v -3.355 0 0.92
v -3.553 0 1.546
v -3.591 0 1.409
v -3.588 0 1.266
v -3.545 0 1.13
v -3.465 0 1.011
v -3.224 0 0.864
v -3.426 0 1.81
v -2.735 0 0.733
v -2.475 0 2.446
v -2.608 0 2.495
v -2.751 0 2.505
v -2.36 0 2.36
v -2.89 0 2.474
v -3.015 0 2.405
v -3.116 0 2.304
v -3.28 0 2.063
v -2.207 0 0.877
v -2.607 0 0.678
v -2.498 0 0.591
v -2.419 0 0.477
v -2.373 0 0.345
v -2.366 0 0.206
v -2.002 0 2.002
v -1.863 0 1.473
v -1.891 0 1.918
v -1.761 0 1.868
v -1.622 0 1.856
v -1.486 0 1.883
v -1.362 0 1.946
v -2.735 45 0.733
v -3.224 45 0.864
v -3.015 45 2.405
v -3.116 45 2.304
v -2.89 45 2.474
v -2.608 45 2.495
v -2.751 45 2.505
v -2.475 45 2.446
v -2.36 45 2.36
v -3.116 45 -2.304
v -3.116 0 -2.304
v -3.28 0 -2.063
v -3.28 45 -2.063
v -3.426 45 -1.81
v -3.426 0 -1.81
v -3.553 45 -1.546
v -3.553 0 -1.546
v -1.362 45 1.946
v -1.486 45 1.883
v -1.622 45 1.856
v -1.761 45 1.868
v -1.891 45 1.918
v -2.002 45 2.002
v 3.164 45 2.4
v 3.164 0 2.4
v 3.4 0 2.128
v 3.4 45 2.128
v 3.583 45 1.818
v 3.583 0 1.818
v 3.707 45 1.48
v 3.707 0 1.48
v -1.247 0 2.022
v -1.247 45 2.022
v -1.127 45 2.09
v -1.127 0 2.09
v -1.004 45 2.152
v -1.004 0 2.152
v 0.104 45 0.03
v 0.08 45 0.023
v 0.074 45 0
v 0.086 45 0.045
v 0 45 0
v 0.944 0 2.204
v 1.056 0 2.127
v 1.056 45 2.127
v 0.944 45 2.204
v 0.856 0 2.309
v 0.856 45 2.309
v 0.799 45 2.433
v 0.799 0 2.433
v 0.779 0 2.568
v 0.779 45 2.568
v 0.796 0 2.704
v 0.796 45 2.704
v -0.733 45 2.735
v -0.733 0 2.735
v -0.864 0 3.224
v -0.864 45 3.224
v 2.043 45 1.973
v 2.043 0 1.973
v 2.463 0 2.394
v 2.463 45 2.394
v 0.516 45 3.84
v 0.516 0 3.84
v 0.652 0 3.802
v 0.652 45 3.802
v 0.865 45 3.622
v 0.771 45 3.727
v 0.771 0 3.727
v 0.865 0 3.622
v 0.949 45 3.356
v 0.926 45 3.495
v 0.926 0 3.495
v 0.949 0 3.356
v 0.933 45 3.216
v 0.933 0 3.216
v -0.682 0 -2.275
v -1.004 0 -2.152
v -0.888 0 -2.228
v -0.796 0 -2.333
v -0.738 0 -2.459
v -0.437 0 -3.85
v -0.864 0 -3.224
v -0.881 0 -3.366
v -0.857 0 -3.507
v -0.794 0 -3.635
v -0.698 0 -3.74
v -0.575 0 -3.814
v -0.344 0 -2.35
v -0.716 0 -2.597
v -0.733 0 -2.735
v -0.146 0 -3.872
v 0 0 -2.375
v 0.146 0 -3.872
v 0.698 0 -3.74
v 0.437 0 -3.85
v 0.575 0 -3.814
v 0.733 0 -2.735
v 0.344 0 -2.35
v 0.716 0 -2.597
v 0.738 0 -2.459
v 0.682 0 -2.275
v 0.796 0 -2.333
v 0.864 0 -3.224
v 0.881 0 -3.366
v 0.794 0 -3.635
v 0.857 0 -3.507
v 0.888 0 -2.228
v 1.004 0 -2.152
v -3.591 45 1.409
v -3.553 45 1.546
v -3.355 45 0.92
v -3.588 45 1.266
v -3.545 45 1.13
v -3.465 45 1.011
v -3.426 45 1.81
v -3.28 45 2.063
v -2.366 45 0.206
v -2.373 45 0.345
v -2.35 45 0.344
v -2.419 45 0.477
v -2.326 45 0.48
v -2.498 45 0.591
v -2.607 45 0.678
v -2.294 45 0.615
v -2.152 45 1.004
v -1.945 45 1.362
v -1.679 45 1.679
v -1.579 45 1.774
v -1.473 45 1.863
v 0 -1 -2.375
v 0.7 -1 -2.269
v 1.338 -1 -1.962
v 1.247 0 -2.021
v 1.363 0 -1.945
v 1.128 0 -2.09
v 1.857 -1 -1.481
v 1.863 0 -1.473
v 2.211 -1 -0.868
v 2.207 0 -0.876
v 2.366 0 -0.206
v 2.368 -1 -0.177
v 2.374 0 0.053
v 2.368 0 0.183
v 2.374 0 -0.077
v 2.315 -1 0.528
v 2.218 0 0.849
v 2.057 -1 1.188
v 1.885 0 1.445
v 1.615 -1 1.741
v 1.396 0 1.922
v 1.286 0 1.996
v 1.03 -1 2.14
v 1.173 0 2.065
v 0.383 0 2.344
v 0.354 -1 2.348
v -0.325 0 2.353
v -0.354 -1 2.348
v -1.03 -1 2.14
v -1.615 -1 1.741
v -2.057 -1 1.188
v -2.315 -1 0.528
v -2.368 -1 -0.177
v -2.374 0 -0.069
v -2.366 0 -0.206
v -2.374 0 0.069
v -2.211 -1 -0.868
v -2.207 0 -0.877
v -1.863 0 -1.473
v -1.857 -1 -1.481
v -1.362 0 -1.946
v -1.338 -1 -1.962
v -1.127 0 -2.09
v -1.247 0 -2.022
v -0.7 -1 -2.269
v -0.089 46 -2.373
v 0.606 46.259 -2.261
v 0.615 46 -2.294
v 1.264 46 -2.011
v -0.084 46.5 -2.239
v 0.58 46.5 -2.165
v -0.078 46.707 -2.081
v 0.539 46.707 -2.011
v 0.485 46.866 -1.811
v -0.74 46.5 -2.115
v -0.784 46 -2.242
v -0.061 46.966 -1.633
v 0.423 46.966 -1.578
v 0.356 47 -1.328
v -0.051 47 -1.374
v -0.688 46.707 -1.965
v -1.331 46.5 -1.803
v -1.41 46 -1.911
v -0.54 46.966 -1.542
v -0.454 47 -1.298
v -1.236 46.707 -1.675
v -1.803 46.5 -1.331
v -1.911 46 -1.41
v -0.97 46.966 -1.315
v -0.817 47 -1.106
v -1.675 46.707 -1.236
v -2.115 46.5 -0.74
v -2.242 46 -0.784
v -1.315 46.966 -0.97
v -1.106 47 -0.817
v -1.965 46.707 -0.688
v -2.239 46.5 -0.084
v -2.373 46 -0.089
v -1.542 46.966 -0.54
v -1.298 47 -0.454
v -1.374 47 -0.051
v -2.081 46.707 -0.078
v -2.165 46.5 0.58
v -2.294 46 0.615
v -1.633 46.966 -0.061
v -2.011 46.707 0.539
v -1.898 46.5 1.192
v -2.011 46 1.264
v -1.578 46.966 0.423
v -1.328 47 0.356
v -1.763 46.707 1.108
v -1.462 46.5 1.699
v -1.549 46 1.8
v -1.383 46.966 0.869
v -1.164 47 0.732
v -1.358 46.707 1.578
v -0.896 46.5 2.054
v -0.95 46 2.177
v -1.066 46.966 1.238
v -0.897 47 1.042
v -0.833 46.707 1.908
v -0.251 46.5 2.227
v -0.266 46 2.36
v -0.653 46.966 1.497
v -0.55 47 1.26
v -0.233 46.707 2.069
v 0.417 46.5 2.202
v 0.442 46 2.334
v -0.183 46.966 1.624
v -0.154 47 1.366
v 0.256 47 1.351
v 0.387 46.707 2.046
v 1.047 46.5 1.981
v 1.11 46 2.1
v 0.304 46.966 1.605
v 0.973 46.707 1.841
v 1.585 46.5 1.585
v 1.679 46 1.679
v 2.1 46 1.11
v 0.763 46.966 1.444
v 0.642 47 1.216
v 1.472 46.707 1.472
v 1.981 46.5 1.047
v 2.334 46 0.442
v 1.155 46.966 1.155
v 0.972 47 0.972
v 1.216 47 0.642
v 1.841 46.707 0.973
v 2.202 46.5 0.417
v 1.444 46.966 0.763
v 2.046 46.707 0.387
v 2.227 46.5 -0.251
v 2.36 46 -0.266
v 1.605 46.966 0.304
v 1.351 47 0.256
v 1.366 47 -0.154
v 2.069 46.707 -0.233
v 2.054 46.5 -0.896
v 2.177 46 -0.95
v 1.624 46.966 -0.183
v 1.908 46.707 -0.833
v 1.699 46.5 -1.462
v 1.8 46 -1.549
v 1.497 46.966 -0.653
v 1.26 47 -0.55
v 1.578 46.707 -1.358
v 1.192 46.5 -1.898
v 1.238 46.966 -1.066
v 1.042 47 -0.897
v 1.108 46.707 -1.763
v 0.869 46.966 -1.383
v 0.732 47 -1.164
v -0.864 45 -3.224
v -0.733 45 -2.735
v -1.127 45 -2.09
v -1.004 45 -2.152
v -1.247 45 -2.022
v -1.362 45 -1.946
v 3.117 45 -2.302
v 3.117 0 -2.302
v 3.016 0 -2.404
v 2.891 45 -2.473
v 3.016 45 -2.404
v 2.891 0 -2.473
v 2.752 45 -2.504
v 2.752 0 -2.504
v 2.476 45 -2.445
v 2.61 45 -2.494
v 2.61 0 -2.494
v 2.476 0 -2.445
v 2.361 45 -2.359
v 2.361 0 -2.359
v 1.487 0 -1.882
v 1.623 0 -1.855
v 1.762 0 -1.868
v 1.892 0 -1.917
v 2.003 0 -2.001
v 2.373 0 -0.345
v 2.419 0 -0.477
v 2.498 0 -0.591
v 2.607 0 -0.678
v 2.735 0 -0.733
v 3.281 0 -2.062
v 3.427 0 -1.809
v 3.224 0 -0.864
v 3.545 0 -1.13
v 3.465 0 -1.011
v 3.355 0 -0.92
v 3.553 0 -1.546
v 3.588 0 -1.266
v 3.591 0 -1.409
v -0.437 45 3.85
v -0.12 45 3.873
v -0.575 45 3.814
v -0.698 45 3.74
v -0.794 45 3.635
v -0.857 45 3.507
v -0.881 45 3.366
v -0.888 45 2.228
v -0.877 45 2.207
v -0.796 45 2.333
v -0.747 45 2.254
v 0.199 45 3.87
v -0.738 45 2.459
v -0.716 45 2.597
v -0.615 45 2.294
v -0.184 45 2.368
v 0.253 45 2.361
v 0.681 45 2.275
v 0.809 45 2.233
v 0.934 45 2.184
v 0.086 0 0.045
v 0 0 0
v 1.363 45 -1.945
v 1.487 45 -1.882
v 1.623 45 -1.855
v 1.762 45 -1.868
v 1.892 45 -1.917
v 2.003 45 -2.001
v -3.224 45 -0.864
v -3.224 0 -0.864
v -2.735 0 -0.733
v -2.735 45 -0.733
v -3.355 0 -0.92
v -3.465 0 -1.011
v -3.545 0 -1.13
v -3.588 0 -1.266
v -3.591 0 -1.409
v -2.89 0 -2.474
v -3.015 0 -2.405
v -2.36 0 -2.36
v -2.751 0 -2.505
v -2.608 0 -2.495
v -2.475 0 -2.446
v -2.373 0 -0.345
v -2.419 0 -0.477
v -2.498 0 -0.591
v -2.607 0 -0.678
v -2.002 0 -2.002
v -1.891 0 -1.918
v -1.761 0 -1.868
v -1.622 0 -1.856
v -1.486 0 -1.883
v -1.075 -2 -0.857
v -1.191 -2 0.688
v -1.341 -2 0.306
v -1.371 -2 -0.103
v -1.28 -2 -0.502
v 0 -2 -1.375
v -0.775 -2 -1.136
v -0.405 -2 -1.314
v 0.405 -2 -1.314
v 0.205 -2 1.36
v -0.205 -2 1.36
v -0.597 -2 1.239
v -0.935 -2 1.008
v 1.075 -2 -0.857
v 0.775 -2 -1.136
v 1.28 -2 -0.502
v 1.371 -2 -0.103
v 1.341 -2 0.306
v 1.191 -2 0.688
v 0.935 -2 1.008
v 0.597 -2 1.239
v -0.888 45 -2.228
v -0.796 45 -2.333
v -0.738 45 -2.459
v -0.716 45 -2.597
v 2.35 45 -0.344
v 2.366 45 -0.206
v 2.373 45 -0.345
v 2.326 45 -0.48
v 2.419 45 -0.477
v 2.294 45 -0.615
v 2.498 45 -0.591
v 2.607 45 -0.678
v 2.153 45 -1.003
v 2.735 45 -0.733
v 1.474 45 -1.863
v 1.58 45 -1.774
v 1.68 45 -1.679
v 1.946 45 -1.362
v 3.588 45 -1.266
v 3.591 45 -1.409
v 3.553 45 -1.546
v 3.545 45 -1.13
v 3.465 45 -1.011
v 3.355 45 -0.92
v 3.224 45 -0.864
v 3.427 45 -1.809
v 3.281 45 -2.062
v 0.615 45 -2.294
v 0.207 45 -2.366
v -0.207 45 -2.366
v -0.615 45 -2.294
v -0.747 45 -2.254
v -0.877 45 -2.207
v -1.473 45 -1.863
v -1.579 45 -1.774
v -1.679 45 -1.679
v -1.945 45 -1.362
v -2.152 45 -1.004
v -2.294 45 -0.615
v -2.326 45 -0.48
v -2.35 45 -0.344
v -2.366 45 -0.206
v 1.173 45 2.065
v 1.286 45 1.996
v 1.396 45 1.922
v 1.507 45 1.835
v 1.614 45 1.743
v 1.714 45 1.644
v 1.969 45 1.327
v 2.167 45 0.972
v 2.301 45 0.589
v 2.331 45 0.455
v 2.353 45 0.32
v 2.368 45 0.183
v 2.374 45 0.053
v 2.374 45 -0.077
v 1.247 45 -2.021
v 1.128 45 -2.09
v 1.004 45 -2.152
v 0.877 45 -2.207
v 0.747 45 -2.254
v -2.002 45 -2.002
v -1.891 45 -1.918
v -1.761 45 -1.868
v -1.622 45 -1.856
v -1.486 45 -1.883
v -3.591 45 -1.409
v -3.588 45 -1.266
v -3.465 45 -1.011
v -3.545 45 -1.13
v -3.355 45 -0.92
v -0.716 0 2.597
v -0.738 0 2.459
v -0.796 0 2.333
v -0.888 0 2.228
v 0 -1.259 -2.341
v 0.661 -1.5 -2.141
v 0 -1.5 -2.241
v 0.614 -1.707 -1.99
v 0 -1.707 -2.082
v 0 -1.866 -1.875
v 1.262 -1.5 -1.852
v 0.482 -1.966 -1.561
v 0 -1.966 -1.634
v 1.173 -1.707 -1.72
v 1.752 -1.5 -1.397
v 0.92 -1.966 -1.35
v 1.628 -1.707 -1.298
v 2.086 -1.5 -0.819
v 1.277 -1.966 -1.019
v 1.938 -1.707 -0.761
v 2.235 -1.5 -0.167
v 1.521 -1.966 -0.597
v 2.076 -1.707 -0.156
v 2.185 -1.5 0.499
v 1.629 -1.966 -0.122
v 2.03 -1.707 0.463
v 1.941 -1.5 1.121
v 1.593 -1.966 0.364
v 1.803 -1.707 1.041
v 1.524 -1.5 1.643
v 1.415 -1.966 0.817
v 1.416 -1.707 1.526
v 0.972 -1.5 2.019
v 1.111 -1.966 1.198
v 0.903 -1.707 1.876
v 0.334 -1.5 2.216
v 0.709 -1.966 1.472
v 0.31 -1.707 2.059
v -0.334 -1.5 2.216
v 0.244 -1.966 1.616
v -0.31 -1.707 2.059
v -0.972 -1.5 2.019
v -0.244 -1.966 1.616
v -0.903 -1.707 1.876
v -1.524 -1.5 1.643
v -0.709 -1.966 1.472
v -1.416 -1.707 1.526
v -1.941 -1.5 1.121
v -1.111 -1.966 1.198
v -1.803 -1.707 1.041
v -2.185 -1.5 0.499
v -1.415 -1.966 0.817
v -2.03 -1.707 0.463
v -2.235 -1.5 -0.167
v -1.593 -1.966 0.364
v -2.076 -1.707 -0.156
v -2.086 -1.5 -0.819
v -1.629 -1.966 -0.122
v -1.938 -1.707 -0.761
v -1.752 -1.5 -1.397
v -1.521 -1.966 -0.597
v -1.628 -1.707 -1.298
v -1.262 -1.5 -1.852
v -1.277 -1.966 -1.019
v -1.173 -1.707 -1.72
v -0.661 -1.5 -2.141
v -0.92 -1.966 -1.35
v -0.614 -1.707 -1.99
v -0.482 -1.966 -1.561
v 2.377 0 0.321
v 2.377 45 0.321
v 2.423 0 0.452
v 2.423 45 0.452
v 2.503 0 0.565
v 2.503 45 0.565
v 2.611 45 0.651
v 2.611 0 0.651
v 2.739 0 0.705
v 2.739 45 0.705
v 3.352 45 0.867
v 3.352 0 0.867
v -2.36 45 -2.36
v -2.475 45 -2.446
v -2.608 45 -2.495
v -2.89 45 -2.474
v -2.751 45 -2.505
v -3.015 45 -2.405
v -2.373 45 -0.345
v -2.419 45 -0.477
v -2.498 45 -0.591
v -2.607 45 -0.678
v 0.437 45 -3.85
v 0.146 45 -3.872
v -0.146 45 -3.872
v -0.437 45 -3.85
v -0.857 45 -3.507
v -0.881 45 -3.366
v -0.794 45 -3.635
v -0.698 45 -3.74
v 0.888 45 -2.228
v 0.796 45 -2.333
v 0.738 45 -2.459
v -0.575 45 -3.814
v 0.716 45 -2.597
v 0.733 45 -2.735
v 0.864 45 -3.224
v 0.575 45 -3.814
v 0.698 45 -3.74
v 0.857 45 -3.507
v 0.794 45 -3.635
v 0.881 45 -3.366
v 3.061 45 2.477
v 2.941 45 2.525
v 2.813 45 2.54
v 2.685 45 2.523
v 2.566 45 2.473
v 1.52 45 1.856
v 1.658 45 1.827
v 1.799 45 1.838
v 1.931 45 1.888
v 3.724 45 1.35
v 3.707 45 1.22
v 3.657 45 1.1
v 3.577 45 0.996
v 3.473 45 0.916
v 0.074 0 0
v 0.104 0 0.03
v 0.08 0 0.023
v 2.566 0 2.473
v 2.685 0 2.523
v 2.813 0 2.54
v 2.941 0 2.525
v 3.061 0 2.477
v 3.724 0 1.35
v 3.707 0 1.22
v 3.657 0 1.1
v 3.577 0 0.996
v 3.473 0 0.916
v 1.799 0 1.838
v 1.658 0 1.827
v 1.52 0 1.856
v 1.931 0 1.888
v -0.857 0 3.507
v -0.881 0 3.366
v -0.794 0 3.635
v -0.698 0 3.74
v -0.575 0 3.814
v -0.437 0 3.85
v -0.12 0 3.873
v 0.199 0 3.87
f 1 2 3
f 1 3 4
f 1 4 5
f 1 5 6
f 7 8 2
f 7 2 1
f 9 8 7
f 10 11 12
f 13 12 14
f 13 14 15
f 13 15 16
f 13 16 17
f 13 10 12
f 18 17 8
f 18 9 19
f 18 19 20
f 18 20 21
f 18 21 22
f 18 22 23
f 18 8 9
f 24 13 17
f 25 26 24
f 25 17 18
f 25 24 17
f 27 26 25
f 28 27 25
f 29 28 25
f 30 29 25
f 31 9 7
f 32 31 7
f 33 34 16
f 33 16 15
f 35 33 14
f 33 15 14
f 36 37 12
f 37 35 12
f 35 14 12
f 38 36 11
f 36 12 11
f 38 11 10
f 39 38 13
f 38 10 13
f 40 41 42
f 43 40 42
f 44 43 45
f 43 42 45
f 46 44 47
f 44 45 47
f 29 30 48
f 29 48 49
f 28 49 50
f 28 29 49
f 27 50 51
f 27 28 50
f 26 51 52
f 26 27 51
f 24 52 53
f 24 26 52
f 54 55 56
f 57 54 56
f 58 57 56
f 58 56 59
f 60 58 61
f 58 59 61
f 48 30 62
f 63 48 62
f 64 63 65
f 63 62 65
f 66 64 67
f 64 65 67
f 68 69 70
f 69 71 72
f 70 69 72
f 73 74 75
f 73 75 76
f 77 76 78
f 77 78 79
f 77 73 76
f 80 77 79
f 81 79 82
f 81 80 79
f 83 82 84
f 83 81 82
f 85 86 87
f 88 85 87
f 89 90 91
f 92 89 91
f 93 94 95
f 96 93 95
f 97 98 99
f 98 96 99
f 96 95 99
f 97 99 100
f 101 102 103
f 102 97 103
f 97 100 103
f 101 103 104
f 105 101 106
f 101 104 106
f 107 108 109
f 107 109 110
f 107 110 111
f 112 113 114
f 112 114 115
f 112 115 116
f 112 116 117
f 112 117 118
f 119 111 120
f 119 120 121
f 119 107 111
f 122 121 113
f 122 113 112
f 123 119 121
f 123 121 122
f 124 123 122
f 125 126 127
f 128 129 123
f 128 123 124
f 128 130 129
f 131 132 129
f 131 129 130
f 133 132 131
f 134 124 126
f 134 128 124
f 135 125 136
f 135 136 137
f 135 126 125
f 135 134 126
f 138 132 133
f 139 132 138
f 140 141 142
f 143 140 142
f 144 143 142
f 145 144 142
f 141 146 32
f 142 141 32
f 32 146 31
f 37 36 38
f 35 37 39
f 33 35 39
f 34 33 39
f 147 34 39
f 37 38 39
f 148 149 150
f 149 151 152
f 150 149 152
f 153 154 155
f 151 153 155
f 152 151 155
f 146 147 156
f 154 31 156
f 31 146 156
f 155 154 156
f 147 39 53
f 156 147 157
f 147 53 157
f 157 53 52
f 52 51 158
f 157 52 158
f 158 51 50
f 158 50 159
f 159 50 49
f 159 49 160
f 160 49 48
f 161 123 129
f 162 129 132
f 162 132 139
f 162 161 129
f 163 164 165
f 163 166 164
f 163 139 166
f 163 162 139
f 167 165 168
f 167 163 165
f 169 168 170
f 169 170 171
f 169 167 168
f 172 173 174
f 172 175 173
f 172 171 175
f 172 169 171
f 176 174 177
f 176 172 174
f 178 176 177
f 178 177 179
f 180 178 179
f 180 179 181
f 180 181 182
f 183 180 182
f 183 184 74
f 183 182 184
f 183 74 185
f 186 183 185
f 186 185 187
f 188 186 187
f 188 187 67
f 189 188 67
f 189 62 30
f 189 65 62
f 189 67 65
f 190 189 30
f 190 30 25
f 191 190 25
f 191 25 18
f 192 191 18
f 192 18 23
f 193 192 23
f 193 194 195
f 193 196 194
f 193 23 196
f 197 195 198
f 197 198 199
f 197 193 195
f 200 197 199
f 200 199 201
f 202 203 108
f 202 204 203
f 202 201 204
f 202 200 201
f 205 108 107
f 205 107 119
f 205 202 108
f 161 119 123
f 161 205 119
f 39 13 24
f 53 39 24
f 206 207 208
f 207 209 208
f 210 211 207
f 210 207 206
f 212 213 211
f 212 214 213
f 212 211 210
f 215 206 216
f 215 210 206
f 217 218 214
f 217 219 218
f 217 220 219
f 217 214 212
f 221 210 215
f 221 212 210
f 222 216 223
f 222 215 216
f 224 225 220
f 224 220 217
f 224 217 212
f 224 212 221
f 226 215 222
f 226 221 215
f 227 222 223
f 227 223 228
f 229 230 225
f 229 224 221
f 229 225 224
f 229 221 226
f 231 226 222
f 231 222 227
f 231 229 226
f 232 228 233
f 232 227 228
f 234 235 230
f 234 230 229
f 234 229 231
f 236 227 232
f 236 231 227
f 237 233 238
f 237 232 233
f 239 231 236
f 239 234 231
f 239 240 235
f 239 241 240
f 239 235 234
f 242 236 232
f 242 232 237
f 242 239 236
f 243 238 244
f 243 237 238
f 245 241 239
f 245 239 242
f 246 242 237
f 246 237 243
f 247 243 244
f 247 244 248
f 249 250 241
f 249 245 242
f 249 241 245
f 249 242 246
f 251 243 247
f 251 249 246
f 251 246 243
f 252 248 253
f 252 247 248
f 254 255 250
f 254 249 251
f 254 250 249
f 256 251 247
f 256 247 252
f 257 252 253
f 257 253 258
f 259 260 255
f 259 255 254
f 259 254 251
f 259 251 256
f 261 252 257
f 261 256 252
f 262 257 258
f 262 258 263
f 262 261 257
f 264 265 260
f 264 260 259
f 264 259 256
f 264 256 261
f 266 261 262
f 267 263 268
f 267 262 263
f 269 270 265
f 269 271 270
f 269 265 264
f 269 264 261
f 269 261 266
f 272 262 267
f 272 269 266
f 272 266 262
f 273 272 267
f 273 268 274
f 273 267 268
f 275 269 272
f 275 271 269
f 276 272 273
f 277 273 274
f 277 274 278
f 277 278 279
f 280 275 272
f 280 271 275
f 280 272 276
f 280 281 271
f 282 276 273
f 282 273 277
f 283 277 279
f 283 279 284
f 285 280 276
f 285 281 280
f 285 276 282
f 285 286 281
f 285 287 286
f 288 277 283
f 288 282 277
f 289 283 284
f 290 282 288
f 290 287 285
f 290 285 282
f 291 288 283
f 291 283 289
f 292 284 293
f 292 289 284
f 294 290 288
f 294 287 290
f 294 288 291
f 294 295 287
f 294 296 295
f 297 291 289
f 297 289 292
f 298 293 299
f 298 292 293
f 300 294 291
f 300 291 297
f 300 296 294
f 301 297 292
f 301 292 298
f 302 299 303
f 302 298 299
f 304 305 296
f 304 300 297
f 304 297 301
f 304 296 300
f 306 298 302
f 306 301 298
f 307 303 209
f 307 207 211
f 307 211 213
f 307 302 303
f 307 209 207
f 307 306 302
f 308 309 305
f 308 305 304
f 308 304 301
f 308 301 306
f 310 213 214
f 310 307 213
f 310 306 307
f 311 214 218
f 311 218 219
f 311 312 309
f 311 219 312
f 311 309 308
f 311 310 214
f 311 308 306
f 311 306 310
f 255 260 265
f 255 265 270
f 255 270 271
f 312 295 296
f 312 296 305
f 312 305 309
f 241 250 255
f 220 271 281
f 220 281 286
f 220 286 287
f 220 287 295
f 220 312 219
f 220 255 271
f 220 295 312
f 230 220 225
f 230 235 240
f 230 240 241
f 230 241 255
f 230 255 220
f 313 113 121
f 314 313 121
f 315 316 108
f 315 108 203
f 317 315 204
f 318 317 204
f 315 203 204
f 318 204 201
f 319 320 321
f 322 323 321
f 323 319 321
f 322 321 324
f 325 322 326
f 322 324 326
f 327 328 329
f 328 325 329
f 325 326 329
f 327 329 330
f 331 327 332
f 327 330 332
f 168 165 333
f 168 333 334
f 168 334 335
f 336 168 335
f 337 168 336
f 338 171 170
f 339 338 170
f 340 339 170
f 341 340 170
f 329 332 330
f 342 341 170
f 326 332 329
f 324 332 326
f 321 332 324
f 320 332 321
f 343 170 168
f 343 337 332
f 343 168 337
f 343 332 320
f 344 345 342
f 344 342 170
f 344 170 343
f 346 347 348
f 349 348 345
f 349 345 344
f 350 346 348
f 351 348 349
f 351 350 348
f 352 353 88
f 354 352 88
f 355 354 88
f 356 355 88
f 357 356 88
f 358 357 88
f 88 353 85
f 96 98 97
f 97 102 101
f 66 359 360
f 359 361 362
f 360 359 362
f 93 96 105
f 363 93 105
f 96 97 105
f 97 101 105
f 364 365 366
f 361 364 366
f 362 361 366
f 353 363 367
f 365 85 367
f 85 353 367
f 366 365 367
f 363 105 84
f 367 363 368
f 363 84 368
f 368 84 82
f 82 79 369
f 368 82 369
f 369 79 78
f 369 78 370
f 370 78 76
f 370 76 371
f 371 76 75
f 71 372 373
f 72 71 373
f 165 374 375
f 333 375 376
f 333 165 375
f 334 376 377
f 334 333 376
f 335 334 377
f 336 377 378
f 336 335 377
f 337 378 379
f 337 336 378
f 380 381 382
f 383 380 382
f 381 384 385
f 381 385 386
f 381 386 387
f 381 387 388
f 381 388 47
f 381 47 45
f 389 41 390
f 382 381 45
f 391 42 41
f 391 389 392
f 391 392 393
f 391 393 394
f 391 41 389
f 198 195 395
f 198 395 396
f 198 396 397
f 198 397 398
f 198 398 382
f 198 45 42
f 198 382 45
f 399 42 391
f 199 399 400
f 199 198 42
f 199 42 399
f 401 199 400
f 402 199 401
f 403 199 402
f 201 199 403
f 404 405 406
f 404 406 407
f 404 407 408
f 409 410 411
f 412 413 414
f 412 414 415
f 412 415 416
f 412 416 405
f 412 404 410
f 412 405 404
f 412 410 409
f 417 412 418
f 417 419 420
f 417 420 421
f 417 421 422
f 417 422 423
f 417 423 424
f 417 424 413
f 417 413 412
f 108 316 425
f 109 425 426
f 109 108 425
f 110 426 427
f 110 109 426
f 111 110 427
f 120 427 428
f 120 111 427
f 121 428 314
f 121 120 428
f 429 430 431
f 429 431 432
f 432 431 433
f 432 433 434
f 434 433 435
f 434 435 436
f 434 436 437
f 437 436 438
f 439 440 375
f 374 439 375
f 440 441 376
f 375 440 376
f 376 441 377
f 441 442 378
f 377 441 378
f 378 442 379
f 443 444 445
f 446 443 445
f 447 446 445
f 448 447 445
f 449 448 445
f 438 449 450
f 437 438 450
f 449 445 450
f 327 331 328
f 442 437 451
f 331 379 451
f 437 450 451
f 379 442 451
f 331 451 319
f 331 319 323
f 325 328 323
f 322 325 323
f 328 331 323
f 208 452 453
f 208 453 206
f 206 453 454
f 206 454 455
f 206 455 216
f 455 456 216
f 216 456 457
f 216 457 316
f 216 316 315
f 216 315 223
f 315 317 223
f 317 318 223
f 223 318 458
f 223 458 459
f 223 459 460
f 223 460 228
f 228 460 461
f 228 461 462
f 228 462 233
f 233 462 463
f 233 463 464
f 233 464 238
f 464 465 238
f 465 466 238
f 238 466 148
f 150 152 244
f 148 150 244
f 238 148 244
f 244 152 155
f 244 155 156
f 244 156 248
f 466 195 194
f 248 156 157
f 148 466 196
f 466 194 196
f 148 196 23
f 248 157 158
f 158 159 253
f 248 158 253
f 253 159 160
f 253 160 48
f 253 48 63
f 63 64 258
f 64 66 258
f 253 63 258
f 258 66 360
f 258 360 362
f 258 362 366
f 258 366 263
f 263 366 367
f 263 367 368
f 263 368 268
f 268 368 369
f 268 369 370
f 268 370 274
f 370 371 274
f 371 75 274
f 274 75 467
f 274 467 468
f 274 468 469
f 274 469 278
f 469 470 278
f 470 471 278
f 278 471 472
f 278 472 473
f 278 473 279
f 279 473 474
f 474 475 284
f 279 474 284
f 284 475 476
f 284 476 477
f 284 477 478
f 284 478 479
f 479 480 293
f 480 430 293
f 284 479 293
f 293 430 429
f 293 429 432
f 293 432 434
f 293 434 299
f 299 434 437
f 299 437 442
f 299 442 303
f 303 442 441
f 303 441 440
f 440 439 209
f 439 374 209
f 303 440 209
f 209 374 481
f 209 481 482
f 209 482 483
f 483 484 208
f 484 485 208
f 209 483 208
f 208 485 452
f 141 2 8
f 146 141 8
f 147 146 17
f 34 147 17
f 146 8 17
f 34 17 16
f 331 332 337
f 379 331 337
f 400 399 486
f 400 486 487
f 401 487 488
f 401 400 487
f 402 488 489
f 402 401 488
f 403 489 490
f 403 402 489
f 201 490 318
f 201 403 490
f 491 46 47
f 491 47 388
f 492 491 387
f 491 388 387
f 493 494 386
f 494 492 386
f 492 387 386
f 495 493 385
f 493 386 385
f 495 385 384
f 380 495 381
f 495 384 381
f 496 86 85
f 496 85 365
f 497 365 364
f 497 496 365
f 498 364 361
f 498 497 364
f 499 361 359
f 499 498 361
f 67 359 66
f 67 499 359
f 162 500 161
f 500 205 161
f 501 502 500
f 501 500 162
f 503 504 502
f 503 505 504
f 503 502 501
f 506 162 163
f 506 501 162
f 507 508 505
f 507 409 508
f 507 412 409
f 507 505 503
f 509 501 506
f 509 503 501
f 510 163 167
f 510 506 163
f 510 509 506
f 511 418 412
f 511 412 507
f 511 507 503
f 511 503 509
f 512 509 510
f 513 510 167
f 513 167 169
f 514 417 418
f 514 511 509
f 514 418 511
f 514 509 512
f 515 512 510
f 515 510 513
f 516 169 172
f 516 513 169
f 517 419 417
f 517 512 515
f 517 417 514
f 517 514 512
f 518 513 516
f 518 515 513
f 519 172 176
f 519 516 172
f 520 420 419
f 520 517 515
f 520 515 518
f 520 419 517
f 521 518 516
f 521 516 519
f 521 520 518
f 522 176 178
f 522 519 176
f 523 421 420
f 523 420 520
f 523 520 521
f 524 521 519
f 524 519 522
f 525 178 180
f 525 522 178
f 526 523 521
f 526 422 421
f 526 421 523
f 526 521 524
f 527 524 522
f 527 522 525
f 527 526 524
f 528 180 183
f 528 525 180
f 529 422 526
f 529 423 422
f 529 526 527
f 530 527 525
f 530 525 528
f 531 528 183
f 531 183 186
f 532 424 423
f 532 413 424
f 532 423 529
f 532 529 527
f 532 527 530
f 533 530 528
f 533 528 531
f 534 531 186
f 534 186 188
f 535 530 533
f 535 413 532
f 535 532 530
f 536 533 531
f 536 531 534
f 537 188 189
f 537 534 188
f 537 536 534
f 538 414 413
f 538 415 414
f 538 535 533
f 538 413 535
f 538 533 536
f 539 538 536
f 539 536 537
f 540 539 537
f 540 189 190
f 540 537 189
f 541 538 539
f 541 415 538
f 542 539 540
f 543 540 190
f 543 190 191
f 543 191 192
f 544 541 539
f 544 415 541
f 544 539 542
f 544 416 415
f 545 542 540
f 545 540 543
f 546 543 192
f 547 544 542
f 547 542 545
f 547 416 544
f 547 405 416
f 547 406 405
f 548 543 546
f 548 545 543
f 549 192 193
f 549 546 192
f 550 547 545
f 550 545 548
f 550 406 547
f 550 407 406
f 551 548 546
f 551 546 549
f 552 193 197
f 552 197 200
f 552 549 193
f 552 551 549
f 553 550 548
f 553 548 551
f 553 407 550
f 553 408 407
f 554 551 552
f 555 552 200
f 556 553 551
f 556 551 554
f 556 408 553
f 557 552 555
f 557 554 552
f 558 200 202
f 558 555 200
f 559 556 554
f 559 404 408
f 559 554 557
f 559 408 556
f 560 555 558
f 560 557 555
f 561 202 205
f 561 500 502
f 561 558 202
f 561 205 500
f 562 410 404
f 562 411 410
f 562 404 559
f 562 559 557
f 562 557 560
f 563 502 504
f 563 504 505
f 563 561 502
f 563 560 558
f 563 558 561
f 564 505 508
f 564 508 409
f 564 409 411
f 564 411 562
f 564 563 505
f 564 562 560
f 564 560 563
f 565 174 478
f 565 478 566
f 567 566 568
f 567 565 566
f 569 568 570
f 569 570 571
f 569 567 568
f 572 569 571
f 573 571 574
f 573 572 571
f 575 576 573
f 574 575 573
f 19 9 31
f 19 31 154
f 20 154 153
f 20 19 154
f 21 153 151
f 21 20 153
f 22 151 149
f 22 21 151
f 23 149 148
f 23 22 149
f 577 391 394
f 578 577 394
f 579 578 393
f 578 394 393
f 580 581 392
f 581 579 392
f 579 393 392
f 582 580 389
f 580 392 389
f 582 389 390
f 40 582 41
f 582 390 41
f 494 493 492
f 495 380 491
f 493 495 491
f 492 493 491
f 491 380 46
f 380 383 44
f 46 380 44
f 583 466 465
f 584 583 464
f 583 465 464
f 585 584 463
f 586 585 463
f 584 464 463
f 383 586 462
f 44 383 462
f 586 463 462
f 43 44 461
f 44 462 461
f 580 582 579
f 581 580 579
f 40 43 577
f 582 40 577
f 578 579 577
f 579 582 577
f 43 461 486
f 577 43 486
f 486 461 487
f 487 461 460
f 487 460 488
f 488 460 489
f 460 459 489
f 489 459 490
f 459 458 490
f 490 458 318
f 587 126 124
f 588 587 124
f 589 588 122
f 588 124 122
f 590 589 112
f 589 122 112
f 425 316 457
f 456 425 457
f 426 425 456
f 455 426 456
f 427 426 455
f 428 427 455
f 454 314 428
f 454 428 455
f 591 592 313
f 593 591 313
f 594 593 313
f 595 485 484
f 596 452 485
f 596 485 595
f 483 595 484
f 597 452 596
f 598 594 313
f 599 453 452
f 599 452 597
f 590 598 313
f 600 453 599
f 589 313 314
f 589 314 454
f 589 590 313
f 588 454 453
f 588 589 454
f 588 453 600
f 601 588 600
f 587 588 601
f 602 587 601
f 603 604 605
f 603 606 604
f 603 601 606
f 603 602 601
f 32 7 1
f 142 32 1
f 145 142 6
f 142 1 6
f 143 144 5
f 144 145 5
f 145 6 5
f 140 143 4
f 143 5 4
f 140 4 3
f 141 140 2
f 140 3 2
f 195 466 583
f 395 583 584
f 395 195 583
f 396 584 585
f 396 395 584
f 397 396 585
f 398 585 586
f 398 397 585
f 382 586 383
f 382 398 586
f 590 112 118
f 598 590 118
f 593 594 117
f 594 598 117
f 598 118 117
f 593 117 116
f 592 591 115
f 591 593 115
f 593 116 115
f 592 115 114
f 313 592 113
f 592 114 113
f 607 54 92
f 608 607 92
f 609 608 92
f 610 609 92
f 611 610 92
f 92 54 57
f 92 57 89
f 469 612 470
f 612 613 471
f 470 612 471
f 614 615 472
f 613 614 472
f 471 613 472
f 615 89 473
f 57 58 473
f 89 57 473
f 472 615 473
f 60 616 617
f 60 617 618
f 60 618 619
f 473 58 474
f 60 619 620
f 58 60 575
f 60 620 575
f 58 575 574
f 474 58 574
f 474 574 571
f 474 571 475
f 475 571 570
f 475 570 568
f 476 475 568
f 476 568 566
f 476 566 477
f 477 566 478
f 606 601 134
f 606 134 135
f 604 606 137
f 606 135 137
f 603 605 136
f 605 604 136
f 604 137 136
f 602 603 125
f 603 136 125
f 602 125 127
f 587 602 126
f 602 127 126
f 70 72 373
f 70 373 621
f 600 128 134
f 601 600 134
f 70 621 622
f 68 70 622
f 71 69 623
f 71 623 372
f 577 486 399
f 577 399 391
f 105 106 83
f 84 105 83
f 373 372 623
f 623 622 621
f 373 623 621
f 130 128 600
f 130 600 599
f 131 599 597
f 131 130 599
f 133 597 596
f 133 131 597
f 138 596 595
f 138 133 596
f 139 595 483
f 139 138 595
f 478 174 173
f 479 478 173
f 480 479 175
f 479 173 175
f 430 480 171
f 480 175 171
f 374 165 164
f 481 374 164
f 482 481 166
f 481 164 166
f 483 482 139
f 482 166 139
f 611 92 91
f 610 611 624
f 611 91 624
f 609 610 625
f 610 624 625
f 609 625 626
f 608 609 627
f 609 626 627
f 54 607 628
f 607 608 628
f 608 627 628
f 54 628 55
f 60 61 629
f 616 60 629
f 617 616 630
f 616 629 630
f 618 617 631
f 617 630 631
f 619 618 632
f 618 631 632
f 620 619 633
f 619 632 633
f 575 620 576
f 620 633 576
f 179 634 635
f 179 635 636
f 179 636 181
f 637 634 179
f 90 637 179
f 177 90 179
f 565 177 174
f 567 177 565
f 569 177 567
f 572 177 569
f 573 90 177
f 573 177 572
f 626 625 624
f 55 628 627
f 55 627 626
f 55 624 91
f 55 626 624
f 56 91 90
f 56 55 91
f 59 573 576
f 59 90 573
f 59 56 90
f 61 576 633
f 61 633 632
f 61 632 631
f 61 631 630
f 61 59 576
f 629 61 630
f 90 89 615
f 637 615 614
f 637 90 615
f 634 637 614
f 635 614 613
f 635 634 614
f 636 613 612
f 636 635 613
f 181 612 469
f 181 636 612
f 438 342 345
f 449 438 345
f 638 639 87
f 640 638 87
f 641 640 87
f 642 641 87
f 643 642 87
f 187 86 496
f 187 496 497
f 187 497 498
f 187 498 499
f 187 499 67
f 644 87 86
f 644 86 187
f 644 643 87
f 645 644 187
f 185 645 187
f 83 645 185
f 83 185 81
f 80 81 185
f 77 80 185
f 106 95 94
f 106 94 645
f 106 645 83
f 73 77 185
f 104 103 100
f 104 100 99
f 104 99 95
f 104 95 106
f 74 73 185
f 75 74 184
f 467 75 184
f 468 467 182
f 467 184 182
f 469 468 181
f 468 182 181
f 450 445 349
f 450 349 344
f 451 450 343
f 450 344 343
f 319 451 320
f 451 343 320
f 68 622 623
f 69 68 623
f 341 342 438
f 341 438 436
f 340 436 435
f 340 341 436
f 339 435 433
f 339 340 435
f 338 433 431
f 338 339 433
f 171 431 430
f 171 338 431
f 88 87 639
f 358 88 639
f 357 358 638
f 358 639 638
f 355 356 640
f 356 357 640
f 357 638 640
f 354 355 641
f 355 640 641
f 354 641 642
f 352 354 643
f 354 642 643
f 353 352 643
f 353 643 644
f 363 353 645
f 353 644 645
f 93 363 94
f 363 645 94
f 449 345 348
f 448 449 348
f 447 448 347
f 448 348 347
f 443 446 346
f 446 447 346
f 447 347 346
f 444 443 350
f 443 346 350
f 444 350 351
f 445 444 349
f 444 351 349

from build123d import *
from build123d.topology import SkipClean

# Parameters (mm, degrees)
BOSS_EXTRUDE1_DEPTH = 45
SKETCH4_R           = 2.375
BOSS_EXTRUDE3_DEPTH = 2
FILLET1_R           = 0.5
BOSS_EXTRUDE5_START = 2
SKETCH6_R           = 2.375
BOSS_EXTRUDE5_DEPTH = 2
FILLET2_R           = 1


with BuildPart() as part:
    # Sketch2 → Boss-Extrude1 (new body)
    with BuildSketch(Plane(origin=(0, 0, 0), x_dir=(1, 0, 0), z_dir=(0, 1, 0))):
        with BuildLine():
            Line((3.775215965, -0.978645895), (2.300774305, -0.58912019))
            ThreePointArc((2.300774305, -0.58912019), (2.374963211, 0.013219106), (2.294073837, 0.614695232))
            Line((2.294073837, 0.614695232), (3.742962577, 1.0029238))
            ThreePointArc((3.742962577, 1.0029238), (3.356294138, 1.936727823), (2.741299364, 2.73877761))
            Line((2.741299364, 2.73877761), (1.680151223, 1.678605632))
            ThreePointArc((1.680151223, 1.678605632), (1.187973207, 2.056537055), (0.614695232, 2.294073837))
            Line((0.614695232, 2.294073837), (1.0029238, 3.742962577))
            ThreePointArc((1.0029238, 3.742962577), (0, 3.875), (-1.0029238, 3.742962577))
            Line((-1.0029238, 3.742962577), (-0.614695232, 2.294073837))
            ThreePointArc((-0.614695232, 2.294073837), (-1.1875, 2.056810334), (-1.679378605, 1.679378605))
            Line((-1.679378605, 1.679378605), (-2.740038777, 2.740038777))
            ThreePointArc((-2.740038777, 2.740038777), (-3.35584844, 1.9375), (-3.742962577, 1.0029238))
            Line((-3.742962577, 1.0029238), (-2.294073837, 0.614695232))
            ThreePointArc((-2.294073837, 0.614695232), (-2.375, 0), (-2.294073837, -0.614695232))
            Line((-2.294073837, -0.614695232), (-3.742962577, -1.0029238))
            ThreePointArc((-3.742962577, -1.0029238), (-3.35584844, -1.9375), (-2.740038777, -2.740038777))
            Line((-2.740038777, -2.740038777), (-1.679378605, -1.679378605))
            ThreePointArc((-1.679378605, -1.679378605), (-1.1875, -2.056810334), (-0.614695232, -2.294073837))
            Line((-0.614695232, -2.294073837), (-1.0029238, -3.742962577))
            ThreePointArc((-1.0029238, -3.742962577), (0.033967076, -3.874851125), (1.068386506, -3.724805401))
            Line((1.068386506, -3.724805401), (0.681359786, -2.275164575))
            ThreePointArc((0.681359786, -2.275164575), (1.238849907, -2.026296106), (1.714477211, -1.643530618))
            Line((1.714477211, -1.643530618), (2.767163136, -2.698133353))
            ThreePointArc((2.767163136, -2.698133353), (3.500652231, -1.972912562), (3.775215965, -0.978645895))
        make_face()
        Polygon((0.085836926, -0.044584082), (0, 0), (0.073933818, 0), (0.104207494, -0.030328801), (0.080162685, -0.023330742), align=None, mode=Mode.SUBTRACT)
    extrude(amount=BOSS_EXTRUDE1_DEPTH)

    # Sketch4 → Boss-Extrude3 (add)
    with BuildSketch(Plane(origin=(0, 45, 0), x_dir=(1, 0, 0), z_dir=(0, 1, 0))):
        with Locations(Location((0, 0, 0), (0, 0, 75))):
            Circle(SKETCH4_R)
    extrude(amount=BOSS_EXTRUDE3_DEPTH)

    # Fillet1
    # the kernel refuses this fillet: 0.5 mm, written as the material it adds along each edge
    with BuildSketch(Plane(origin=(-2.294073837, 0, 0.614695232), x_dir=(-0.1735157400494046, 0, -0.9848310961556339), z_dir=(0, 1, 0)), Plane(origin=(-1.679378605, 0, -1.679378605), x_dir=(0.7661308776829403, 0, -0.6426845869170722), z_dir=(0, 1, 0)), Plane(origin=(0.614695232, 0, -2.294073837), x_dir=(0.939646617732385, 0, 0.3421465092384974), z_dir=(0, 1, 0)), Plane(origin=(2.294073837, 0, -0.614695232), x_dir=(0.1735157400495284, 0, 0.9848310961556122), z_dir=(0, 1, 0)), Plane(origin=(-0.614695232, 0, 2.294073837), x_dir=(-0.9396466177323688, 0, -0.3421465092385419), z_dir=(0, 1, 0))) as fillet1_piece_1:
        with BuildLine():
            CenterArc((0.458270974, 0.498091484), FILLET1_R, 185.007705084, 79.984589832)
            Line((-0.03982051, 0.45444663), (0, 0))
            ThreePointArc((0, 0), (0.20731306, 0.00906545), (0.414626119, 0))
        make_face()
    extrude(amount=45)
    with BuildSketch(Plane(origin=(-2.294073837, 0, -0.614695232), x_dir=(-0.17351574004940104, 0, 0.9848310961556345), z_dir=(0, 1, 0)), Plane(origin=(-0.614695232, 0, -2.294073837), x_dir=(-0.9396466177323672, 0, 0.3421465092385461), z_dir=(0, 1, 0)), Plane(origin=(1.680151223, 0, -1.678605632), x_dir=(-0.7658350540129166, 0, -0.643037067395833), z_dir=(0, 1, 0))) as fillet1_piece_2:
        with BuildLine():
            CenterArc((0.458270974, -0.498091484), FILLET1_R, 95.007705084, 79.984589832)
            Line((-0.03982051, -0.45444663), (0, 0))
            ThreePointArc((0, 0), (0.20731306, -0.00906545), (0.414626119, 0))
        make_face()
    extrude(amount=45)
    with BuildSketch(Plane(origin=(2.300774305, 0, 0.58912019), x_dir=(0.9668296370387235, 0, 0.2554221073900419), z_dir=(0, 1, 0))) as fillet1_piece_3:
        with BuildLine():
            CenterArc((0.453002414, 0.5), FILLET1_R, 190.38170854, 79.61829146)
            ThreePointArc((-0.038812111, 0.409897433), (-0.010506812, 0.205791362), (0, 0))
            Line((0, 0), (0.453002414, 0))
        make_face()
    extrude(amount=45)
    with BuildSketch(Plane(origin=(1.714477211, 0, 1.643530618), x_dir=(0.7064632978713469, 0, 0.7077496794494086), z_dir=(0, 1, 0))) as fillet1_piece_4:
        with BuildLine():
            CenterArc((0.465508471, -0.5), FILLET1_R, 90, 81.041880237)
            ThreePointArc((-0.02839274, -0.422143763), (-0.00477723, -0.211705398), (0, 0))
            Line((0, 0), (0.465508471, 0))
        make_face()
    extrude(amount=45)
    with BuildSketch(Plane(origin=(0.681359786, 0, 2.275164575), x_dir=(0.25794627414893684, 0, 0.966159262053975), z_dir=(0, 1, 0))) as fillet1_piece_5:
        with BuildLine():
            CenterArc((0.443713653, 0.5), FILLET1_R, 191.464392376, 78.535607624)
            ThreePointArc((-0.046310555, 0.400620549), (-0.014636445, 0.201295026), (0, 0))
            Line((0, 0), (0.443713653, 0))
        make_face()
    extrude(amount=45)
    with BuildSketch(Plane(origin=(-1.679378605, 0, 1.679378605), x_dir=(-0.7071067811865471, 0, 0.707106781186548), z_dir=(0, 1, 0))) as fillet1_piece_6:
        with BuildLine():
            CenterArc((0.456187913, 0.5), FILLET1_R, 190.015410168, 79.984589832)
            ThreePointArc((-0.036192593, 0.413043478), (-0.00906545, 0.20731306), (0, 0))
            Line((0, 0), (0.456187913, 0))
        make_face()
    extrude(amount=45)
    # the kernel refuses this fillet: 0.5 mm, written as the material it takes off along each edge
    with BuildSketch(Plane(origin=(-2.740038777, -1.439160897, 2.740038777), x_dir=(-0.6526300069150477, 0, -0.7576767609436524), z_dir=(0, 1, 0)), Plane(origin=(-3.742962577, -1.439160897, -1.0029238), x_dir=(0.3298523193767966, 0, -0.9440325457322686), z_dir=(0, 1, 0)), Plane(origin=(2.741299364, -1.439160897, -2.73877761), x_dir=(0.652281279601926, 0, 0.7579769998363237), z_dir=(0, 1, 0))) as fillet1_2_piece_1:
        with BuildLine():
            CenterArc((0.538524723, -0.49861874), FILLET1_R, 85.740187873, 98.519624254)
            Line((0.039905983, -0.535758376), (0, 0))
            ThreePointArc((0, 0), (0.287832179, 0.010704768), (0.575664359, 0))
        make_face()
    extrude(amount=47.878321794, mode=Mode.SUBTRACT)
    with BuildSketch(Plane(origin=(-3.742962577, -1.439160897, 1.0029238), x_dir=(0.9659258262890679, 0, -0.2588190451025218), z_dir=(0, 1, 0)), Plane(origin=(-2.740038777, -1.439160897, -2.740038777), x_dir=(0.7071067811865476, 0, 0.7071067811865476), z_dir=(0, 1, 0)), Plane(origin=(3.742962577, -1.439160897, -1.0029238), x_dir=(-0.9659258262890681, 0, 0.25881904510252185), z_dir=(0, 1, 0)), Plane(origin=(-1.0029238, -1.439160897, 3.742962577), x_dir=(0.2588190451025216, 0, -0.9659258262890681), z_dir=(0, 1, 0))) as fillet1_2_piece_2:
        with BuildLine():
            CenterArc((0.537242519, -0.5), FILLET1_R, 90, 98.519624254)
            ThreePointArc((0.04275993, -0.574074074), (0.010704768, -0.287832179), (0, 0))
            Line((0, 0), (0.537242519, 0))
        make_face()
    extrude(amount=47.878321794, mode=Mode.SUBTRACT)
    with BuildSketch(Plane(origin=(-1.0029238, -1.439160897, -3.742962577), x_dir=(0.25881904510252174, 0, 0.965925826289068), z_dir=(0, 1, 0))) as fillet1_2_piece_3:
        with BuildLine():
            CenterArc((0.537242519, 0.5), FILLET1_R, 171.480375746, 98.519624254)
            ThreePointArc((0.04275993, 0.574074074), (0.010704768, 0.287832179), (0, 0))
            Line((0, 0), (0.537242519, 0))
        make_face()
    extrude(amount=47.878321794, mode=Mode.SUBTRACT)
    with BuildSketch(Plane(origin=(1.0029238, -1.439160897, -3.742962577), x_dir=(-0.9824823262918377, 0, -0.1863557847886099), z_dir=(0, 1, 0))) as fillet1_2_piece_4:
        with BuildLine():
            CenterArc((0.538524723, 0.49861874), FILLET1_R, 175.740187873, 98.519624254)
            Line((0.039905983, 0.535758376), (0, 0))
            ThreePointArc((0, 0), (0.287832179, -0.010704768), (0.575664359, 0))
        make_face()
    extrude(amount=47.878321794, mode=Mode.SUBTRACT)
    with BuildSketch(Plane(origin=(3.775215965, -1.264396568, 0.978645895), x_dir=(-0.9668296370387236, 0, -0.25542210739004173), z_dir=(0, 1, 0))) as fillet1_2_piece_5:
        with BuildLine():
            CenterArc((0.437999819, 0.5), FILLET1_R, 179.77718135, 90.22281865)
            ThreePointArc((-0.0619964, 0.501944455), (-0.046928547, 0.249004631), (0, 0))
            Line((0, 0), (0.437999819, 0))
        make_face()
    extrude(amount=47.528793137, mode=Mode.SUBTRACT)
    with BuildSketch(Plane(origin=(2.767163136, -1.241563867, 2.698133353), x_dir=(0.8000663385432955, 0, -0.5999115384203949), z_dir=(0, 1, 0))) as fillet1_2_piece_6:
        with BuildLine():
            CenterArc((0.434547354, 0.496131331), FILLET1_R, 188.084320914, 89.047719887)
            Line((-0.060483736, 0.425816179), (0, 0))
            ThreePointArc((0, 0), (0.248312773, -0.015474675), (0.496625547, 0))
        make_face()
    extrude(amount=47.483127735, mode=Mode.SUBTRACT)
    with BuildSketch(Plane(origin=(1.068386506, -1.410819518, 3.724805401), x_dir=(-0.9787647804449897, 0, 0.20498659605074468), z_dir=(0, 1, 0))) as fillet1_2_piece_7:
        with BuildLine():
            CenterArc((0.527919562, -0.498672678), FILLET1_R, 85.824226653, 97.295295094)
            Line((0.028660468, -0.525882193), (0, 0))
            ThreePointArc((0, 0), (0.282163904, 0.010286747), (0.564327807, 0))
        make_face()
    extrude(amount=47.821639036, mode=Mode.SUBTRACT)

    # Sketch6 → Boss-Extrude5 (add)
    with SkipClean():  # the faces are left unmerged after this step: merging them gives an invalid solid
        with BuildSketch(Plane.XZ.offset(BOSS_EXTRUDE5_START)):
            with Locations(Location((0, 0, 0), (0, 0, 270))):
                Circle(SKETCH6_R)
        extrude(amount=-BOSS_EXTRUDE5_DEPTH)

    # Fillet2
    fillet2_edges = [part.edges().sort_by_distance(p)[0] for p in [
        (-0.614695232, 47, 2.294073837),
        (0, -2, 2.375),
    ]]
    fillet(fillet2_edges, radius=FILLET2_R)


solid = part.part
